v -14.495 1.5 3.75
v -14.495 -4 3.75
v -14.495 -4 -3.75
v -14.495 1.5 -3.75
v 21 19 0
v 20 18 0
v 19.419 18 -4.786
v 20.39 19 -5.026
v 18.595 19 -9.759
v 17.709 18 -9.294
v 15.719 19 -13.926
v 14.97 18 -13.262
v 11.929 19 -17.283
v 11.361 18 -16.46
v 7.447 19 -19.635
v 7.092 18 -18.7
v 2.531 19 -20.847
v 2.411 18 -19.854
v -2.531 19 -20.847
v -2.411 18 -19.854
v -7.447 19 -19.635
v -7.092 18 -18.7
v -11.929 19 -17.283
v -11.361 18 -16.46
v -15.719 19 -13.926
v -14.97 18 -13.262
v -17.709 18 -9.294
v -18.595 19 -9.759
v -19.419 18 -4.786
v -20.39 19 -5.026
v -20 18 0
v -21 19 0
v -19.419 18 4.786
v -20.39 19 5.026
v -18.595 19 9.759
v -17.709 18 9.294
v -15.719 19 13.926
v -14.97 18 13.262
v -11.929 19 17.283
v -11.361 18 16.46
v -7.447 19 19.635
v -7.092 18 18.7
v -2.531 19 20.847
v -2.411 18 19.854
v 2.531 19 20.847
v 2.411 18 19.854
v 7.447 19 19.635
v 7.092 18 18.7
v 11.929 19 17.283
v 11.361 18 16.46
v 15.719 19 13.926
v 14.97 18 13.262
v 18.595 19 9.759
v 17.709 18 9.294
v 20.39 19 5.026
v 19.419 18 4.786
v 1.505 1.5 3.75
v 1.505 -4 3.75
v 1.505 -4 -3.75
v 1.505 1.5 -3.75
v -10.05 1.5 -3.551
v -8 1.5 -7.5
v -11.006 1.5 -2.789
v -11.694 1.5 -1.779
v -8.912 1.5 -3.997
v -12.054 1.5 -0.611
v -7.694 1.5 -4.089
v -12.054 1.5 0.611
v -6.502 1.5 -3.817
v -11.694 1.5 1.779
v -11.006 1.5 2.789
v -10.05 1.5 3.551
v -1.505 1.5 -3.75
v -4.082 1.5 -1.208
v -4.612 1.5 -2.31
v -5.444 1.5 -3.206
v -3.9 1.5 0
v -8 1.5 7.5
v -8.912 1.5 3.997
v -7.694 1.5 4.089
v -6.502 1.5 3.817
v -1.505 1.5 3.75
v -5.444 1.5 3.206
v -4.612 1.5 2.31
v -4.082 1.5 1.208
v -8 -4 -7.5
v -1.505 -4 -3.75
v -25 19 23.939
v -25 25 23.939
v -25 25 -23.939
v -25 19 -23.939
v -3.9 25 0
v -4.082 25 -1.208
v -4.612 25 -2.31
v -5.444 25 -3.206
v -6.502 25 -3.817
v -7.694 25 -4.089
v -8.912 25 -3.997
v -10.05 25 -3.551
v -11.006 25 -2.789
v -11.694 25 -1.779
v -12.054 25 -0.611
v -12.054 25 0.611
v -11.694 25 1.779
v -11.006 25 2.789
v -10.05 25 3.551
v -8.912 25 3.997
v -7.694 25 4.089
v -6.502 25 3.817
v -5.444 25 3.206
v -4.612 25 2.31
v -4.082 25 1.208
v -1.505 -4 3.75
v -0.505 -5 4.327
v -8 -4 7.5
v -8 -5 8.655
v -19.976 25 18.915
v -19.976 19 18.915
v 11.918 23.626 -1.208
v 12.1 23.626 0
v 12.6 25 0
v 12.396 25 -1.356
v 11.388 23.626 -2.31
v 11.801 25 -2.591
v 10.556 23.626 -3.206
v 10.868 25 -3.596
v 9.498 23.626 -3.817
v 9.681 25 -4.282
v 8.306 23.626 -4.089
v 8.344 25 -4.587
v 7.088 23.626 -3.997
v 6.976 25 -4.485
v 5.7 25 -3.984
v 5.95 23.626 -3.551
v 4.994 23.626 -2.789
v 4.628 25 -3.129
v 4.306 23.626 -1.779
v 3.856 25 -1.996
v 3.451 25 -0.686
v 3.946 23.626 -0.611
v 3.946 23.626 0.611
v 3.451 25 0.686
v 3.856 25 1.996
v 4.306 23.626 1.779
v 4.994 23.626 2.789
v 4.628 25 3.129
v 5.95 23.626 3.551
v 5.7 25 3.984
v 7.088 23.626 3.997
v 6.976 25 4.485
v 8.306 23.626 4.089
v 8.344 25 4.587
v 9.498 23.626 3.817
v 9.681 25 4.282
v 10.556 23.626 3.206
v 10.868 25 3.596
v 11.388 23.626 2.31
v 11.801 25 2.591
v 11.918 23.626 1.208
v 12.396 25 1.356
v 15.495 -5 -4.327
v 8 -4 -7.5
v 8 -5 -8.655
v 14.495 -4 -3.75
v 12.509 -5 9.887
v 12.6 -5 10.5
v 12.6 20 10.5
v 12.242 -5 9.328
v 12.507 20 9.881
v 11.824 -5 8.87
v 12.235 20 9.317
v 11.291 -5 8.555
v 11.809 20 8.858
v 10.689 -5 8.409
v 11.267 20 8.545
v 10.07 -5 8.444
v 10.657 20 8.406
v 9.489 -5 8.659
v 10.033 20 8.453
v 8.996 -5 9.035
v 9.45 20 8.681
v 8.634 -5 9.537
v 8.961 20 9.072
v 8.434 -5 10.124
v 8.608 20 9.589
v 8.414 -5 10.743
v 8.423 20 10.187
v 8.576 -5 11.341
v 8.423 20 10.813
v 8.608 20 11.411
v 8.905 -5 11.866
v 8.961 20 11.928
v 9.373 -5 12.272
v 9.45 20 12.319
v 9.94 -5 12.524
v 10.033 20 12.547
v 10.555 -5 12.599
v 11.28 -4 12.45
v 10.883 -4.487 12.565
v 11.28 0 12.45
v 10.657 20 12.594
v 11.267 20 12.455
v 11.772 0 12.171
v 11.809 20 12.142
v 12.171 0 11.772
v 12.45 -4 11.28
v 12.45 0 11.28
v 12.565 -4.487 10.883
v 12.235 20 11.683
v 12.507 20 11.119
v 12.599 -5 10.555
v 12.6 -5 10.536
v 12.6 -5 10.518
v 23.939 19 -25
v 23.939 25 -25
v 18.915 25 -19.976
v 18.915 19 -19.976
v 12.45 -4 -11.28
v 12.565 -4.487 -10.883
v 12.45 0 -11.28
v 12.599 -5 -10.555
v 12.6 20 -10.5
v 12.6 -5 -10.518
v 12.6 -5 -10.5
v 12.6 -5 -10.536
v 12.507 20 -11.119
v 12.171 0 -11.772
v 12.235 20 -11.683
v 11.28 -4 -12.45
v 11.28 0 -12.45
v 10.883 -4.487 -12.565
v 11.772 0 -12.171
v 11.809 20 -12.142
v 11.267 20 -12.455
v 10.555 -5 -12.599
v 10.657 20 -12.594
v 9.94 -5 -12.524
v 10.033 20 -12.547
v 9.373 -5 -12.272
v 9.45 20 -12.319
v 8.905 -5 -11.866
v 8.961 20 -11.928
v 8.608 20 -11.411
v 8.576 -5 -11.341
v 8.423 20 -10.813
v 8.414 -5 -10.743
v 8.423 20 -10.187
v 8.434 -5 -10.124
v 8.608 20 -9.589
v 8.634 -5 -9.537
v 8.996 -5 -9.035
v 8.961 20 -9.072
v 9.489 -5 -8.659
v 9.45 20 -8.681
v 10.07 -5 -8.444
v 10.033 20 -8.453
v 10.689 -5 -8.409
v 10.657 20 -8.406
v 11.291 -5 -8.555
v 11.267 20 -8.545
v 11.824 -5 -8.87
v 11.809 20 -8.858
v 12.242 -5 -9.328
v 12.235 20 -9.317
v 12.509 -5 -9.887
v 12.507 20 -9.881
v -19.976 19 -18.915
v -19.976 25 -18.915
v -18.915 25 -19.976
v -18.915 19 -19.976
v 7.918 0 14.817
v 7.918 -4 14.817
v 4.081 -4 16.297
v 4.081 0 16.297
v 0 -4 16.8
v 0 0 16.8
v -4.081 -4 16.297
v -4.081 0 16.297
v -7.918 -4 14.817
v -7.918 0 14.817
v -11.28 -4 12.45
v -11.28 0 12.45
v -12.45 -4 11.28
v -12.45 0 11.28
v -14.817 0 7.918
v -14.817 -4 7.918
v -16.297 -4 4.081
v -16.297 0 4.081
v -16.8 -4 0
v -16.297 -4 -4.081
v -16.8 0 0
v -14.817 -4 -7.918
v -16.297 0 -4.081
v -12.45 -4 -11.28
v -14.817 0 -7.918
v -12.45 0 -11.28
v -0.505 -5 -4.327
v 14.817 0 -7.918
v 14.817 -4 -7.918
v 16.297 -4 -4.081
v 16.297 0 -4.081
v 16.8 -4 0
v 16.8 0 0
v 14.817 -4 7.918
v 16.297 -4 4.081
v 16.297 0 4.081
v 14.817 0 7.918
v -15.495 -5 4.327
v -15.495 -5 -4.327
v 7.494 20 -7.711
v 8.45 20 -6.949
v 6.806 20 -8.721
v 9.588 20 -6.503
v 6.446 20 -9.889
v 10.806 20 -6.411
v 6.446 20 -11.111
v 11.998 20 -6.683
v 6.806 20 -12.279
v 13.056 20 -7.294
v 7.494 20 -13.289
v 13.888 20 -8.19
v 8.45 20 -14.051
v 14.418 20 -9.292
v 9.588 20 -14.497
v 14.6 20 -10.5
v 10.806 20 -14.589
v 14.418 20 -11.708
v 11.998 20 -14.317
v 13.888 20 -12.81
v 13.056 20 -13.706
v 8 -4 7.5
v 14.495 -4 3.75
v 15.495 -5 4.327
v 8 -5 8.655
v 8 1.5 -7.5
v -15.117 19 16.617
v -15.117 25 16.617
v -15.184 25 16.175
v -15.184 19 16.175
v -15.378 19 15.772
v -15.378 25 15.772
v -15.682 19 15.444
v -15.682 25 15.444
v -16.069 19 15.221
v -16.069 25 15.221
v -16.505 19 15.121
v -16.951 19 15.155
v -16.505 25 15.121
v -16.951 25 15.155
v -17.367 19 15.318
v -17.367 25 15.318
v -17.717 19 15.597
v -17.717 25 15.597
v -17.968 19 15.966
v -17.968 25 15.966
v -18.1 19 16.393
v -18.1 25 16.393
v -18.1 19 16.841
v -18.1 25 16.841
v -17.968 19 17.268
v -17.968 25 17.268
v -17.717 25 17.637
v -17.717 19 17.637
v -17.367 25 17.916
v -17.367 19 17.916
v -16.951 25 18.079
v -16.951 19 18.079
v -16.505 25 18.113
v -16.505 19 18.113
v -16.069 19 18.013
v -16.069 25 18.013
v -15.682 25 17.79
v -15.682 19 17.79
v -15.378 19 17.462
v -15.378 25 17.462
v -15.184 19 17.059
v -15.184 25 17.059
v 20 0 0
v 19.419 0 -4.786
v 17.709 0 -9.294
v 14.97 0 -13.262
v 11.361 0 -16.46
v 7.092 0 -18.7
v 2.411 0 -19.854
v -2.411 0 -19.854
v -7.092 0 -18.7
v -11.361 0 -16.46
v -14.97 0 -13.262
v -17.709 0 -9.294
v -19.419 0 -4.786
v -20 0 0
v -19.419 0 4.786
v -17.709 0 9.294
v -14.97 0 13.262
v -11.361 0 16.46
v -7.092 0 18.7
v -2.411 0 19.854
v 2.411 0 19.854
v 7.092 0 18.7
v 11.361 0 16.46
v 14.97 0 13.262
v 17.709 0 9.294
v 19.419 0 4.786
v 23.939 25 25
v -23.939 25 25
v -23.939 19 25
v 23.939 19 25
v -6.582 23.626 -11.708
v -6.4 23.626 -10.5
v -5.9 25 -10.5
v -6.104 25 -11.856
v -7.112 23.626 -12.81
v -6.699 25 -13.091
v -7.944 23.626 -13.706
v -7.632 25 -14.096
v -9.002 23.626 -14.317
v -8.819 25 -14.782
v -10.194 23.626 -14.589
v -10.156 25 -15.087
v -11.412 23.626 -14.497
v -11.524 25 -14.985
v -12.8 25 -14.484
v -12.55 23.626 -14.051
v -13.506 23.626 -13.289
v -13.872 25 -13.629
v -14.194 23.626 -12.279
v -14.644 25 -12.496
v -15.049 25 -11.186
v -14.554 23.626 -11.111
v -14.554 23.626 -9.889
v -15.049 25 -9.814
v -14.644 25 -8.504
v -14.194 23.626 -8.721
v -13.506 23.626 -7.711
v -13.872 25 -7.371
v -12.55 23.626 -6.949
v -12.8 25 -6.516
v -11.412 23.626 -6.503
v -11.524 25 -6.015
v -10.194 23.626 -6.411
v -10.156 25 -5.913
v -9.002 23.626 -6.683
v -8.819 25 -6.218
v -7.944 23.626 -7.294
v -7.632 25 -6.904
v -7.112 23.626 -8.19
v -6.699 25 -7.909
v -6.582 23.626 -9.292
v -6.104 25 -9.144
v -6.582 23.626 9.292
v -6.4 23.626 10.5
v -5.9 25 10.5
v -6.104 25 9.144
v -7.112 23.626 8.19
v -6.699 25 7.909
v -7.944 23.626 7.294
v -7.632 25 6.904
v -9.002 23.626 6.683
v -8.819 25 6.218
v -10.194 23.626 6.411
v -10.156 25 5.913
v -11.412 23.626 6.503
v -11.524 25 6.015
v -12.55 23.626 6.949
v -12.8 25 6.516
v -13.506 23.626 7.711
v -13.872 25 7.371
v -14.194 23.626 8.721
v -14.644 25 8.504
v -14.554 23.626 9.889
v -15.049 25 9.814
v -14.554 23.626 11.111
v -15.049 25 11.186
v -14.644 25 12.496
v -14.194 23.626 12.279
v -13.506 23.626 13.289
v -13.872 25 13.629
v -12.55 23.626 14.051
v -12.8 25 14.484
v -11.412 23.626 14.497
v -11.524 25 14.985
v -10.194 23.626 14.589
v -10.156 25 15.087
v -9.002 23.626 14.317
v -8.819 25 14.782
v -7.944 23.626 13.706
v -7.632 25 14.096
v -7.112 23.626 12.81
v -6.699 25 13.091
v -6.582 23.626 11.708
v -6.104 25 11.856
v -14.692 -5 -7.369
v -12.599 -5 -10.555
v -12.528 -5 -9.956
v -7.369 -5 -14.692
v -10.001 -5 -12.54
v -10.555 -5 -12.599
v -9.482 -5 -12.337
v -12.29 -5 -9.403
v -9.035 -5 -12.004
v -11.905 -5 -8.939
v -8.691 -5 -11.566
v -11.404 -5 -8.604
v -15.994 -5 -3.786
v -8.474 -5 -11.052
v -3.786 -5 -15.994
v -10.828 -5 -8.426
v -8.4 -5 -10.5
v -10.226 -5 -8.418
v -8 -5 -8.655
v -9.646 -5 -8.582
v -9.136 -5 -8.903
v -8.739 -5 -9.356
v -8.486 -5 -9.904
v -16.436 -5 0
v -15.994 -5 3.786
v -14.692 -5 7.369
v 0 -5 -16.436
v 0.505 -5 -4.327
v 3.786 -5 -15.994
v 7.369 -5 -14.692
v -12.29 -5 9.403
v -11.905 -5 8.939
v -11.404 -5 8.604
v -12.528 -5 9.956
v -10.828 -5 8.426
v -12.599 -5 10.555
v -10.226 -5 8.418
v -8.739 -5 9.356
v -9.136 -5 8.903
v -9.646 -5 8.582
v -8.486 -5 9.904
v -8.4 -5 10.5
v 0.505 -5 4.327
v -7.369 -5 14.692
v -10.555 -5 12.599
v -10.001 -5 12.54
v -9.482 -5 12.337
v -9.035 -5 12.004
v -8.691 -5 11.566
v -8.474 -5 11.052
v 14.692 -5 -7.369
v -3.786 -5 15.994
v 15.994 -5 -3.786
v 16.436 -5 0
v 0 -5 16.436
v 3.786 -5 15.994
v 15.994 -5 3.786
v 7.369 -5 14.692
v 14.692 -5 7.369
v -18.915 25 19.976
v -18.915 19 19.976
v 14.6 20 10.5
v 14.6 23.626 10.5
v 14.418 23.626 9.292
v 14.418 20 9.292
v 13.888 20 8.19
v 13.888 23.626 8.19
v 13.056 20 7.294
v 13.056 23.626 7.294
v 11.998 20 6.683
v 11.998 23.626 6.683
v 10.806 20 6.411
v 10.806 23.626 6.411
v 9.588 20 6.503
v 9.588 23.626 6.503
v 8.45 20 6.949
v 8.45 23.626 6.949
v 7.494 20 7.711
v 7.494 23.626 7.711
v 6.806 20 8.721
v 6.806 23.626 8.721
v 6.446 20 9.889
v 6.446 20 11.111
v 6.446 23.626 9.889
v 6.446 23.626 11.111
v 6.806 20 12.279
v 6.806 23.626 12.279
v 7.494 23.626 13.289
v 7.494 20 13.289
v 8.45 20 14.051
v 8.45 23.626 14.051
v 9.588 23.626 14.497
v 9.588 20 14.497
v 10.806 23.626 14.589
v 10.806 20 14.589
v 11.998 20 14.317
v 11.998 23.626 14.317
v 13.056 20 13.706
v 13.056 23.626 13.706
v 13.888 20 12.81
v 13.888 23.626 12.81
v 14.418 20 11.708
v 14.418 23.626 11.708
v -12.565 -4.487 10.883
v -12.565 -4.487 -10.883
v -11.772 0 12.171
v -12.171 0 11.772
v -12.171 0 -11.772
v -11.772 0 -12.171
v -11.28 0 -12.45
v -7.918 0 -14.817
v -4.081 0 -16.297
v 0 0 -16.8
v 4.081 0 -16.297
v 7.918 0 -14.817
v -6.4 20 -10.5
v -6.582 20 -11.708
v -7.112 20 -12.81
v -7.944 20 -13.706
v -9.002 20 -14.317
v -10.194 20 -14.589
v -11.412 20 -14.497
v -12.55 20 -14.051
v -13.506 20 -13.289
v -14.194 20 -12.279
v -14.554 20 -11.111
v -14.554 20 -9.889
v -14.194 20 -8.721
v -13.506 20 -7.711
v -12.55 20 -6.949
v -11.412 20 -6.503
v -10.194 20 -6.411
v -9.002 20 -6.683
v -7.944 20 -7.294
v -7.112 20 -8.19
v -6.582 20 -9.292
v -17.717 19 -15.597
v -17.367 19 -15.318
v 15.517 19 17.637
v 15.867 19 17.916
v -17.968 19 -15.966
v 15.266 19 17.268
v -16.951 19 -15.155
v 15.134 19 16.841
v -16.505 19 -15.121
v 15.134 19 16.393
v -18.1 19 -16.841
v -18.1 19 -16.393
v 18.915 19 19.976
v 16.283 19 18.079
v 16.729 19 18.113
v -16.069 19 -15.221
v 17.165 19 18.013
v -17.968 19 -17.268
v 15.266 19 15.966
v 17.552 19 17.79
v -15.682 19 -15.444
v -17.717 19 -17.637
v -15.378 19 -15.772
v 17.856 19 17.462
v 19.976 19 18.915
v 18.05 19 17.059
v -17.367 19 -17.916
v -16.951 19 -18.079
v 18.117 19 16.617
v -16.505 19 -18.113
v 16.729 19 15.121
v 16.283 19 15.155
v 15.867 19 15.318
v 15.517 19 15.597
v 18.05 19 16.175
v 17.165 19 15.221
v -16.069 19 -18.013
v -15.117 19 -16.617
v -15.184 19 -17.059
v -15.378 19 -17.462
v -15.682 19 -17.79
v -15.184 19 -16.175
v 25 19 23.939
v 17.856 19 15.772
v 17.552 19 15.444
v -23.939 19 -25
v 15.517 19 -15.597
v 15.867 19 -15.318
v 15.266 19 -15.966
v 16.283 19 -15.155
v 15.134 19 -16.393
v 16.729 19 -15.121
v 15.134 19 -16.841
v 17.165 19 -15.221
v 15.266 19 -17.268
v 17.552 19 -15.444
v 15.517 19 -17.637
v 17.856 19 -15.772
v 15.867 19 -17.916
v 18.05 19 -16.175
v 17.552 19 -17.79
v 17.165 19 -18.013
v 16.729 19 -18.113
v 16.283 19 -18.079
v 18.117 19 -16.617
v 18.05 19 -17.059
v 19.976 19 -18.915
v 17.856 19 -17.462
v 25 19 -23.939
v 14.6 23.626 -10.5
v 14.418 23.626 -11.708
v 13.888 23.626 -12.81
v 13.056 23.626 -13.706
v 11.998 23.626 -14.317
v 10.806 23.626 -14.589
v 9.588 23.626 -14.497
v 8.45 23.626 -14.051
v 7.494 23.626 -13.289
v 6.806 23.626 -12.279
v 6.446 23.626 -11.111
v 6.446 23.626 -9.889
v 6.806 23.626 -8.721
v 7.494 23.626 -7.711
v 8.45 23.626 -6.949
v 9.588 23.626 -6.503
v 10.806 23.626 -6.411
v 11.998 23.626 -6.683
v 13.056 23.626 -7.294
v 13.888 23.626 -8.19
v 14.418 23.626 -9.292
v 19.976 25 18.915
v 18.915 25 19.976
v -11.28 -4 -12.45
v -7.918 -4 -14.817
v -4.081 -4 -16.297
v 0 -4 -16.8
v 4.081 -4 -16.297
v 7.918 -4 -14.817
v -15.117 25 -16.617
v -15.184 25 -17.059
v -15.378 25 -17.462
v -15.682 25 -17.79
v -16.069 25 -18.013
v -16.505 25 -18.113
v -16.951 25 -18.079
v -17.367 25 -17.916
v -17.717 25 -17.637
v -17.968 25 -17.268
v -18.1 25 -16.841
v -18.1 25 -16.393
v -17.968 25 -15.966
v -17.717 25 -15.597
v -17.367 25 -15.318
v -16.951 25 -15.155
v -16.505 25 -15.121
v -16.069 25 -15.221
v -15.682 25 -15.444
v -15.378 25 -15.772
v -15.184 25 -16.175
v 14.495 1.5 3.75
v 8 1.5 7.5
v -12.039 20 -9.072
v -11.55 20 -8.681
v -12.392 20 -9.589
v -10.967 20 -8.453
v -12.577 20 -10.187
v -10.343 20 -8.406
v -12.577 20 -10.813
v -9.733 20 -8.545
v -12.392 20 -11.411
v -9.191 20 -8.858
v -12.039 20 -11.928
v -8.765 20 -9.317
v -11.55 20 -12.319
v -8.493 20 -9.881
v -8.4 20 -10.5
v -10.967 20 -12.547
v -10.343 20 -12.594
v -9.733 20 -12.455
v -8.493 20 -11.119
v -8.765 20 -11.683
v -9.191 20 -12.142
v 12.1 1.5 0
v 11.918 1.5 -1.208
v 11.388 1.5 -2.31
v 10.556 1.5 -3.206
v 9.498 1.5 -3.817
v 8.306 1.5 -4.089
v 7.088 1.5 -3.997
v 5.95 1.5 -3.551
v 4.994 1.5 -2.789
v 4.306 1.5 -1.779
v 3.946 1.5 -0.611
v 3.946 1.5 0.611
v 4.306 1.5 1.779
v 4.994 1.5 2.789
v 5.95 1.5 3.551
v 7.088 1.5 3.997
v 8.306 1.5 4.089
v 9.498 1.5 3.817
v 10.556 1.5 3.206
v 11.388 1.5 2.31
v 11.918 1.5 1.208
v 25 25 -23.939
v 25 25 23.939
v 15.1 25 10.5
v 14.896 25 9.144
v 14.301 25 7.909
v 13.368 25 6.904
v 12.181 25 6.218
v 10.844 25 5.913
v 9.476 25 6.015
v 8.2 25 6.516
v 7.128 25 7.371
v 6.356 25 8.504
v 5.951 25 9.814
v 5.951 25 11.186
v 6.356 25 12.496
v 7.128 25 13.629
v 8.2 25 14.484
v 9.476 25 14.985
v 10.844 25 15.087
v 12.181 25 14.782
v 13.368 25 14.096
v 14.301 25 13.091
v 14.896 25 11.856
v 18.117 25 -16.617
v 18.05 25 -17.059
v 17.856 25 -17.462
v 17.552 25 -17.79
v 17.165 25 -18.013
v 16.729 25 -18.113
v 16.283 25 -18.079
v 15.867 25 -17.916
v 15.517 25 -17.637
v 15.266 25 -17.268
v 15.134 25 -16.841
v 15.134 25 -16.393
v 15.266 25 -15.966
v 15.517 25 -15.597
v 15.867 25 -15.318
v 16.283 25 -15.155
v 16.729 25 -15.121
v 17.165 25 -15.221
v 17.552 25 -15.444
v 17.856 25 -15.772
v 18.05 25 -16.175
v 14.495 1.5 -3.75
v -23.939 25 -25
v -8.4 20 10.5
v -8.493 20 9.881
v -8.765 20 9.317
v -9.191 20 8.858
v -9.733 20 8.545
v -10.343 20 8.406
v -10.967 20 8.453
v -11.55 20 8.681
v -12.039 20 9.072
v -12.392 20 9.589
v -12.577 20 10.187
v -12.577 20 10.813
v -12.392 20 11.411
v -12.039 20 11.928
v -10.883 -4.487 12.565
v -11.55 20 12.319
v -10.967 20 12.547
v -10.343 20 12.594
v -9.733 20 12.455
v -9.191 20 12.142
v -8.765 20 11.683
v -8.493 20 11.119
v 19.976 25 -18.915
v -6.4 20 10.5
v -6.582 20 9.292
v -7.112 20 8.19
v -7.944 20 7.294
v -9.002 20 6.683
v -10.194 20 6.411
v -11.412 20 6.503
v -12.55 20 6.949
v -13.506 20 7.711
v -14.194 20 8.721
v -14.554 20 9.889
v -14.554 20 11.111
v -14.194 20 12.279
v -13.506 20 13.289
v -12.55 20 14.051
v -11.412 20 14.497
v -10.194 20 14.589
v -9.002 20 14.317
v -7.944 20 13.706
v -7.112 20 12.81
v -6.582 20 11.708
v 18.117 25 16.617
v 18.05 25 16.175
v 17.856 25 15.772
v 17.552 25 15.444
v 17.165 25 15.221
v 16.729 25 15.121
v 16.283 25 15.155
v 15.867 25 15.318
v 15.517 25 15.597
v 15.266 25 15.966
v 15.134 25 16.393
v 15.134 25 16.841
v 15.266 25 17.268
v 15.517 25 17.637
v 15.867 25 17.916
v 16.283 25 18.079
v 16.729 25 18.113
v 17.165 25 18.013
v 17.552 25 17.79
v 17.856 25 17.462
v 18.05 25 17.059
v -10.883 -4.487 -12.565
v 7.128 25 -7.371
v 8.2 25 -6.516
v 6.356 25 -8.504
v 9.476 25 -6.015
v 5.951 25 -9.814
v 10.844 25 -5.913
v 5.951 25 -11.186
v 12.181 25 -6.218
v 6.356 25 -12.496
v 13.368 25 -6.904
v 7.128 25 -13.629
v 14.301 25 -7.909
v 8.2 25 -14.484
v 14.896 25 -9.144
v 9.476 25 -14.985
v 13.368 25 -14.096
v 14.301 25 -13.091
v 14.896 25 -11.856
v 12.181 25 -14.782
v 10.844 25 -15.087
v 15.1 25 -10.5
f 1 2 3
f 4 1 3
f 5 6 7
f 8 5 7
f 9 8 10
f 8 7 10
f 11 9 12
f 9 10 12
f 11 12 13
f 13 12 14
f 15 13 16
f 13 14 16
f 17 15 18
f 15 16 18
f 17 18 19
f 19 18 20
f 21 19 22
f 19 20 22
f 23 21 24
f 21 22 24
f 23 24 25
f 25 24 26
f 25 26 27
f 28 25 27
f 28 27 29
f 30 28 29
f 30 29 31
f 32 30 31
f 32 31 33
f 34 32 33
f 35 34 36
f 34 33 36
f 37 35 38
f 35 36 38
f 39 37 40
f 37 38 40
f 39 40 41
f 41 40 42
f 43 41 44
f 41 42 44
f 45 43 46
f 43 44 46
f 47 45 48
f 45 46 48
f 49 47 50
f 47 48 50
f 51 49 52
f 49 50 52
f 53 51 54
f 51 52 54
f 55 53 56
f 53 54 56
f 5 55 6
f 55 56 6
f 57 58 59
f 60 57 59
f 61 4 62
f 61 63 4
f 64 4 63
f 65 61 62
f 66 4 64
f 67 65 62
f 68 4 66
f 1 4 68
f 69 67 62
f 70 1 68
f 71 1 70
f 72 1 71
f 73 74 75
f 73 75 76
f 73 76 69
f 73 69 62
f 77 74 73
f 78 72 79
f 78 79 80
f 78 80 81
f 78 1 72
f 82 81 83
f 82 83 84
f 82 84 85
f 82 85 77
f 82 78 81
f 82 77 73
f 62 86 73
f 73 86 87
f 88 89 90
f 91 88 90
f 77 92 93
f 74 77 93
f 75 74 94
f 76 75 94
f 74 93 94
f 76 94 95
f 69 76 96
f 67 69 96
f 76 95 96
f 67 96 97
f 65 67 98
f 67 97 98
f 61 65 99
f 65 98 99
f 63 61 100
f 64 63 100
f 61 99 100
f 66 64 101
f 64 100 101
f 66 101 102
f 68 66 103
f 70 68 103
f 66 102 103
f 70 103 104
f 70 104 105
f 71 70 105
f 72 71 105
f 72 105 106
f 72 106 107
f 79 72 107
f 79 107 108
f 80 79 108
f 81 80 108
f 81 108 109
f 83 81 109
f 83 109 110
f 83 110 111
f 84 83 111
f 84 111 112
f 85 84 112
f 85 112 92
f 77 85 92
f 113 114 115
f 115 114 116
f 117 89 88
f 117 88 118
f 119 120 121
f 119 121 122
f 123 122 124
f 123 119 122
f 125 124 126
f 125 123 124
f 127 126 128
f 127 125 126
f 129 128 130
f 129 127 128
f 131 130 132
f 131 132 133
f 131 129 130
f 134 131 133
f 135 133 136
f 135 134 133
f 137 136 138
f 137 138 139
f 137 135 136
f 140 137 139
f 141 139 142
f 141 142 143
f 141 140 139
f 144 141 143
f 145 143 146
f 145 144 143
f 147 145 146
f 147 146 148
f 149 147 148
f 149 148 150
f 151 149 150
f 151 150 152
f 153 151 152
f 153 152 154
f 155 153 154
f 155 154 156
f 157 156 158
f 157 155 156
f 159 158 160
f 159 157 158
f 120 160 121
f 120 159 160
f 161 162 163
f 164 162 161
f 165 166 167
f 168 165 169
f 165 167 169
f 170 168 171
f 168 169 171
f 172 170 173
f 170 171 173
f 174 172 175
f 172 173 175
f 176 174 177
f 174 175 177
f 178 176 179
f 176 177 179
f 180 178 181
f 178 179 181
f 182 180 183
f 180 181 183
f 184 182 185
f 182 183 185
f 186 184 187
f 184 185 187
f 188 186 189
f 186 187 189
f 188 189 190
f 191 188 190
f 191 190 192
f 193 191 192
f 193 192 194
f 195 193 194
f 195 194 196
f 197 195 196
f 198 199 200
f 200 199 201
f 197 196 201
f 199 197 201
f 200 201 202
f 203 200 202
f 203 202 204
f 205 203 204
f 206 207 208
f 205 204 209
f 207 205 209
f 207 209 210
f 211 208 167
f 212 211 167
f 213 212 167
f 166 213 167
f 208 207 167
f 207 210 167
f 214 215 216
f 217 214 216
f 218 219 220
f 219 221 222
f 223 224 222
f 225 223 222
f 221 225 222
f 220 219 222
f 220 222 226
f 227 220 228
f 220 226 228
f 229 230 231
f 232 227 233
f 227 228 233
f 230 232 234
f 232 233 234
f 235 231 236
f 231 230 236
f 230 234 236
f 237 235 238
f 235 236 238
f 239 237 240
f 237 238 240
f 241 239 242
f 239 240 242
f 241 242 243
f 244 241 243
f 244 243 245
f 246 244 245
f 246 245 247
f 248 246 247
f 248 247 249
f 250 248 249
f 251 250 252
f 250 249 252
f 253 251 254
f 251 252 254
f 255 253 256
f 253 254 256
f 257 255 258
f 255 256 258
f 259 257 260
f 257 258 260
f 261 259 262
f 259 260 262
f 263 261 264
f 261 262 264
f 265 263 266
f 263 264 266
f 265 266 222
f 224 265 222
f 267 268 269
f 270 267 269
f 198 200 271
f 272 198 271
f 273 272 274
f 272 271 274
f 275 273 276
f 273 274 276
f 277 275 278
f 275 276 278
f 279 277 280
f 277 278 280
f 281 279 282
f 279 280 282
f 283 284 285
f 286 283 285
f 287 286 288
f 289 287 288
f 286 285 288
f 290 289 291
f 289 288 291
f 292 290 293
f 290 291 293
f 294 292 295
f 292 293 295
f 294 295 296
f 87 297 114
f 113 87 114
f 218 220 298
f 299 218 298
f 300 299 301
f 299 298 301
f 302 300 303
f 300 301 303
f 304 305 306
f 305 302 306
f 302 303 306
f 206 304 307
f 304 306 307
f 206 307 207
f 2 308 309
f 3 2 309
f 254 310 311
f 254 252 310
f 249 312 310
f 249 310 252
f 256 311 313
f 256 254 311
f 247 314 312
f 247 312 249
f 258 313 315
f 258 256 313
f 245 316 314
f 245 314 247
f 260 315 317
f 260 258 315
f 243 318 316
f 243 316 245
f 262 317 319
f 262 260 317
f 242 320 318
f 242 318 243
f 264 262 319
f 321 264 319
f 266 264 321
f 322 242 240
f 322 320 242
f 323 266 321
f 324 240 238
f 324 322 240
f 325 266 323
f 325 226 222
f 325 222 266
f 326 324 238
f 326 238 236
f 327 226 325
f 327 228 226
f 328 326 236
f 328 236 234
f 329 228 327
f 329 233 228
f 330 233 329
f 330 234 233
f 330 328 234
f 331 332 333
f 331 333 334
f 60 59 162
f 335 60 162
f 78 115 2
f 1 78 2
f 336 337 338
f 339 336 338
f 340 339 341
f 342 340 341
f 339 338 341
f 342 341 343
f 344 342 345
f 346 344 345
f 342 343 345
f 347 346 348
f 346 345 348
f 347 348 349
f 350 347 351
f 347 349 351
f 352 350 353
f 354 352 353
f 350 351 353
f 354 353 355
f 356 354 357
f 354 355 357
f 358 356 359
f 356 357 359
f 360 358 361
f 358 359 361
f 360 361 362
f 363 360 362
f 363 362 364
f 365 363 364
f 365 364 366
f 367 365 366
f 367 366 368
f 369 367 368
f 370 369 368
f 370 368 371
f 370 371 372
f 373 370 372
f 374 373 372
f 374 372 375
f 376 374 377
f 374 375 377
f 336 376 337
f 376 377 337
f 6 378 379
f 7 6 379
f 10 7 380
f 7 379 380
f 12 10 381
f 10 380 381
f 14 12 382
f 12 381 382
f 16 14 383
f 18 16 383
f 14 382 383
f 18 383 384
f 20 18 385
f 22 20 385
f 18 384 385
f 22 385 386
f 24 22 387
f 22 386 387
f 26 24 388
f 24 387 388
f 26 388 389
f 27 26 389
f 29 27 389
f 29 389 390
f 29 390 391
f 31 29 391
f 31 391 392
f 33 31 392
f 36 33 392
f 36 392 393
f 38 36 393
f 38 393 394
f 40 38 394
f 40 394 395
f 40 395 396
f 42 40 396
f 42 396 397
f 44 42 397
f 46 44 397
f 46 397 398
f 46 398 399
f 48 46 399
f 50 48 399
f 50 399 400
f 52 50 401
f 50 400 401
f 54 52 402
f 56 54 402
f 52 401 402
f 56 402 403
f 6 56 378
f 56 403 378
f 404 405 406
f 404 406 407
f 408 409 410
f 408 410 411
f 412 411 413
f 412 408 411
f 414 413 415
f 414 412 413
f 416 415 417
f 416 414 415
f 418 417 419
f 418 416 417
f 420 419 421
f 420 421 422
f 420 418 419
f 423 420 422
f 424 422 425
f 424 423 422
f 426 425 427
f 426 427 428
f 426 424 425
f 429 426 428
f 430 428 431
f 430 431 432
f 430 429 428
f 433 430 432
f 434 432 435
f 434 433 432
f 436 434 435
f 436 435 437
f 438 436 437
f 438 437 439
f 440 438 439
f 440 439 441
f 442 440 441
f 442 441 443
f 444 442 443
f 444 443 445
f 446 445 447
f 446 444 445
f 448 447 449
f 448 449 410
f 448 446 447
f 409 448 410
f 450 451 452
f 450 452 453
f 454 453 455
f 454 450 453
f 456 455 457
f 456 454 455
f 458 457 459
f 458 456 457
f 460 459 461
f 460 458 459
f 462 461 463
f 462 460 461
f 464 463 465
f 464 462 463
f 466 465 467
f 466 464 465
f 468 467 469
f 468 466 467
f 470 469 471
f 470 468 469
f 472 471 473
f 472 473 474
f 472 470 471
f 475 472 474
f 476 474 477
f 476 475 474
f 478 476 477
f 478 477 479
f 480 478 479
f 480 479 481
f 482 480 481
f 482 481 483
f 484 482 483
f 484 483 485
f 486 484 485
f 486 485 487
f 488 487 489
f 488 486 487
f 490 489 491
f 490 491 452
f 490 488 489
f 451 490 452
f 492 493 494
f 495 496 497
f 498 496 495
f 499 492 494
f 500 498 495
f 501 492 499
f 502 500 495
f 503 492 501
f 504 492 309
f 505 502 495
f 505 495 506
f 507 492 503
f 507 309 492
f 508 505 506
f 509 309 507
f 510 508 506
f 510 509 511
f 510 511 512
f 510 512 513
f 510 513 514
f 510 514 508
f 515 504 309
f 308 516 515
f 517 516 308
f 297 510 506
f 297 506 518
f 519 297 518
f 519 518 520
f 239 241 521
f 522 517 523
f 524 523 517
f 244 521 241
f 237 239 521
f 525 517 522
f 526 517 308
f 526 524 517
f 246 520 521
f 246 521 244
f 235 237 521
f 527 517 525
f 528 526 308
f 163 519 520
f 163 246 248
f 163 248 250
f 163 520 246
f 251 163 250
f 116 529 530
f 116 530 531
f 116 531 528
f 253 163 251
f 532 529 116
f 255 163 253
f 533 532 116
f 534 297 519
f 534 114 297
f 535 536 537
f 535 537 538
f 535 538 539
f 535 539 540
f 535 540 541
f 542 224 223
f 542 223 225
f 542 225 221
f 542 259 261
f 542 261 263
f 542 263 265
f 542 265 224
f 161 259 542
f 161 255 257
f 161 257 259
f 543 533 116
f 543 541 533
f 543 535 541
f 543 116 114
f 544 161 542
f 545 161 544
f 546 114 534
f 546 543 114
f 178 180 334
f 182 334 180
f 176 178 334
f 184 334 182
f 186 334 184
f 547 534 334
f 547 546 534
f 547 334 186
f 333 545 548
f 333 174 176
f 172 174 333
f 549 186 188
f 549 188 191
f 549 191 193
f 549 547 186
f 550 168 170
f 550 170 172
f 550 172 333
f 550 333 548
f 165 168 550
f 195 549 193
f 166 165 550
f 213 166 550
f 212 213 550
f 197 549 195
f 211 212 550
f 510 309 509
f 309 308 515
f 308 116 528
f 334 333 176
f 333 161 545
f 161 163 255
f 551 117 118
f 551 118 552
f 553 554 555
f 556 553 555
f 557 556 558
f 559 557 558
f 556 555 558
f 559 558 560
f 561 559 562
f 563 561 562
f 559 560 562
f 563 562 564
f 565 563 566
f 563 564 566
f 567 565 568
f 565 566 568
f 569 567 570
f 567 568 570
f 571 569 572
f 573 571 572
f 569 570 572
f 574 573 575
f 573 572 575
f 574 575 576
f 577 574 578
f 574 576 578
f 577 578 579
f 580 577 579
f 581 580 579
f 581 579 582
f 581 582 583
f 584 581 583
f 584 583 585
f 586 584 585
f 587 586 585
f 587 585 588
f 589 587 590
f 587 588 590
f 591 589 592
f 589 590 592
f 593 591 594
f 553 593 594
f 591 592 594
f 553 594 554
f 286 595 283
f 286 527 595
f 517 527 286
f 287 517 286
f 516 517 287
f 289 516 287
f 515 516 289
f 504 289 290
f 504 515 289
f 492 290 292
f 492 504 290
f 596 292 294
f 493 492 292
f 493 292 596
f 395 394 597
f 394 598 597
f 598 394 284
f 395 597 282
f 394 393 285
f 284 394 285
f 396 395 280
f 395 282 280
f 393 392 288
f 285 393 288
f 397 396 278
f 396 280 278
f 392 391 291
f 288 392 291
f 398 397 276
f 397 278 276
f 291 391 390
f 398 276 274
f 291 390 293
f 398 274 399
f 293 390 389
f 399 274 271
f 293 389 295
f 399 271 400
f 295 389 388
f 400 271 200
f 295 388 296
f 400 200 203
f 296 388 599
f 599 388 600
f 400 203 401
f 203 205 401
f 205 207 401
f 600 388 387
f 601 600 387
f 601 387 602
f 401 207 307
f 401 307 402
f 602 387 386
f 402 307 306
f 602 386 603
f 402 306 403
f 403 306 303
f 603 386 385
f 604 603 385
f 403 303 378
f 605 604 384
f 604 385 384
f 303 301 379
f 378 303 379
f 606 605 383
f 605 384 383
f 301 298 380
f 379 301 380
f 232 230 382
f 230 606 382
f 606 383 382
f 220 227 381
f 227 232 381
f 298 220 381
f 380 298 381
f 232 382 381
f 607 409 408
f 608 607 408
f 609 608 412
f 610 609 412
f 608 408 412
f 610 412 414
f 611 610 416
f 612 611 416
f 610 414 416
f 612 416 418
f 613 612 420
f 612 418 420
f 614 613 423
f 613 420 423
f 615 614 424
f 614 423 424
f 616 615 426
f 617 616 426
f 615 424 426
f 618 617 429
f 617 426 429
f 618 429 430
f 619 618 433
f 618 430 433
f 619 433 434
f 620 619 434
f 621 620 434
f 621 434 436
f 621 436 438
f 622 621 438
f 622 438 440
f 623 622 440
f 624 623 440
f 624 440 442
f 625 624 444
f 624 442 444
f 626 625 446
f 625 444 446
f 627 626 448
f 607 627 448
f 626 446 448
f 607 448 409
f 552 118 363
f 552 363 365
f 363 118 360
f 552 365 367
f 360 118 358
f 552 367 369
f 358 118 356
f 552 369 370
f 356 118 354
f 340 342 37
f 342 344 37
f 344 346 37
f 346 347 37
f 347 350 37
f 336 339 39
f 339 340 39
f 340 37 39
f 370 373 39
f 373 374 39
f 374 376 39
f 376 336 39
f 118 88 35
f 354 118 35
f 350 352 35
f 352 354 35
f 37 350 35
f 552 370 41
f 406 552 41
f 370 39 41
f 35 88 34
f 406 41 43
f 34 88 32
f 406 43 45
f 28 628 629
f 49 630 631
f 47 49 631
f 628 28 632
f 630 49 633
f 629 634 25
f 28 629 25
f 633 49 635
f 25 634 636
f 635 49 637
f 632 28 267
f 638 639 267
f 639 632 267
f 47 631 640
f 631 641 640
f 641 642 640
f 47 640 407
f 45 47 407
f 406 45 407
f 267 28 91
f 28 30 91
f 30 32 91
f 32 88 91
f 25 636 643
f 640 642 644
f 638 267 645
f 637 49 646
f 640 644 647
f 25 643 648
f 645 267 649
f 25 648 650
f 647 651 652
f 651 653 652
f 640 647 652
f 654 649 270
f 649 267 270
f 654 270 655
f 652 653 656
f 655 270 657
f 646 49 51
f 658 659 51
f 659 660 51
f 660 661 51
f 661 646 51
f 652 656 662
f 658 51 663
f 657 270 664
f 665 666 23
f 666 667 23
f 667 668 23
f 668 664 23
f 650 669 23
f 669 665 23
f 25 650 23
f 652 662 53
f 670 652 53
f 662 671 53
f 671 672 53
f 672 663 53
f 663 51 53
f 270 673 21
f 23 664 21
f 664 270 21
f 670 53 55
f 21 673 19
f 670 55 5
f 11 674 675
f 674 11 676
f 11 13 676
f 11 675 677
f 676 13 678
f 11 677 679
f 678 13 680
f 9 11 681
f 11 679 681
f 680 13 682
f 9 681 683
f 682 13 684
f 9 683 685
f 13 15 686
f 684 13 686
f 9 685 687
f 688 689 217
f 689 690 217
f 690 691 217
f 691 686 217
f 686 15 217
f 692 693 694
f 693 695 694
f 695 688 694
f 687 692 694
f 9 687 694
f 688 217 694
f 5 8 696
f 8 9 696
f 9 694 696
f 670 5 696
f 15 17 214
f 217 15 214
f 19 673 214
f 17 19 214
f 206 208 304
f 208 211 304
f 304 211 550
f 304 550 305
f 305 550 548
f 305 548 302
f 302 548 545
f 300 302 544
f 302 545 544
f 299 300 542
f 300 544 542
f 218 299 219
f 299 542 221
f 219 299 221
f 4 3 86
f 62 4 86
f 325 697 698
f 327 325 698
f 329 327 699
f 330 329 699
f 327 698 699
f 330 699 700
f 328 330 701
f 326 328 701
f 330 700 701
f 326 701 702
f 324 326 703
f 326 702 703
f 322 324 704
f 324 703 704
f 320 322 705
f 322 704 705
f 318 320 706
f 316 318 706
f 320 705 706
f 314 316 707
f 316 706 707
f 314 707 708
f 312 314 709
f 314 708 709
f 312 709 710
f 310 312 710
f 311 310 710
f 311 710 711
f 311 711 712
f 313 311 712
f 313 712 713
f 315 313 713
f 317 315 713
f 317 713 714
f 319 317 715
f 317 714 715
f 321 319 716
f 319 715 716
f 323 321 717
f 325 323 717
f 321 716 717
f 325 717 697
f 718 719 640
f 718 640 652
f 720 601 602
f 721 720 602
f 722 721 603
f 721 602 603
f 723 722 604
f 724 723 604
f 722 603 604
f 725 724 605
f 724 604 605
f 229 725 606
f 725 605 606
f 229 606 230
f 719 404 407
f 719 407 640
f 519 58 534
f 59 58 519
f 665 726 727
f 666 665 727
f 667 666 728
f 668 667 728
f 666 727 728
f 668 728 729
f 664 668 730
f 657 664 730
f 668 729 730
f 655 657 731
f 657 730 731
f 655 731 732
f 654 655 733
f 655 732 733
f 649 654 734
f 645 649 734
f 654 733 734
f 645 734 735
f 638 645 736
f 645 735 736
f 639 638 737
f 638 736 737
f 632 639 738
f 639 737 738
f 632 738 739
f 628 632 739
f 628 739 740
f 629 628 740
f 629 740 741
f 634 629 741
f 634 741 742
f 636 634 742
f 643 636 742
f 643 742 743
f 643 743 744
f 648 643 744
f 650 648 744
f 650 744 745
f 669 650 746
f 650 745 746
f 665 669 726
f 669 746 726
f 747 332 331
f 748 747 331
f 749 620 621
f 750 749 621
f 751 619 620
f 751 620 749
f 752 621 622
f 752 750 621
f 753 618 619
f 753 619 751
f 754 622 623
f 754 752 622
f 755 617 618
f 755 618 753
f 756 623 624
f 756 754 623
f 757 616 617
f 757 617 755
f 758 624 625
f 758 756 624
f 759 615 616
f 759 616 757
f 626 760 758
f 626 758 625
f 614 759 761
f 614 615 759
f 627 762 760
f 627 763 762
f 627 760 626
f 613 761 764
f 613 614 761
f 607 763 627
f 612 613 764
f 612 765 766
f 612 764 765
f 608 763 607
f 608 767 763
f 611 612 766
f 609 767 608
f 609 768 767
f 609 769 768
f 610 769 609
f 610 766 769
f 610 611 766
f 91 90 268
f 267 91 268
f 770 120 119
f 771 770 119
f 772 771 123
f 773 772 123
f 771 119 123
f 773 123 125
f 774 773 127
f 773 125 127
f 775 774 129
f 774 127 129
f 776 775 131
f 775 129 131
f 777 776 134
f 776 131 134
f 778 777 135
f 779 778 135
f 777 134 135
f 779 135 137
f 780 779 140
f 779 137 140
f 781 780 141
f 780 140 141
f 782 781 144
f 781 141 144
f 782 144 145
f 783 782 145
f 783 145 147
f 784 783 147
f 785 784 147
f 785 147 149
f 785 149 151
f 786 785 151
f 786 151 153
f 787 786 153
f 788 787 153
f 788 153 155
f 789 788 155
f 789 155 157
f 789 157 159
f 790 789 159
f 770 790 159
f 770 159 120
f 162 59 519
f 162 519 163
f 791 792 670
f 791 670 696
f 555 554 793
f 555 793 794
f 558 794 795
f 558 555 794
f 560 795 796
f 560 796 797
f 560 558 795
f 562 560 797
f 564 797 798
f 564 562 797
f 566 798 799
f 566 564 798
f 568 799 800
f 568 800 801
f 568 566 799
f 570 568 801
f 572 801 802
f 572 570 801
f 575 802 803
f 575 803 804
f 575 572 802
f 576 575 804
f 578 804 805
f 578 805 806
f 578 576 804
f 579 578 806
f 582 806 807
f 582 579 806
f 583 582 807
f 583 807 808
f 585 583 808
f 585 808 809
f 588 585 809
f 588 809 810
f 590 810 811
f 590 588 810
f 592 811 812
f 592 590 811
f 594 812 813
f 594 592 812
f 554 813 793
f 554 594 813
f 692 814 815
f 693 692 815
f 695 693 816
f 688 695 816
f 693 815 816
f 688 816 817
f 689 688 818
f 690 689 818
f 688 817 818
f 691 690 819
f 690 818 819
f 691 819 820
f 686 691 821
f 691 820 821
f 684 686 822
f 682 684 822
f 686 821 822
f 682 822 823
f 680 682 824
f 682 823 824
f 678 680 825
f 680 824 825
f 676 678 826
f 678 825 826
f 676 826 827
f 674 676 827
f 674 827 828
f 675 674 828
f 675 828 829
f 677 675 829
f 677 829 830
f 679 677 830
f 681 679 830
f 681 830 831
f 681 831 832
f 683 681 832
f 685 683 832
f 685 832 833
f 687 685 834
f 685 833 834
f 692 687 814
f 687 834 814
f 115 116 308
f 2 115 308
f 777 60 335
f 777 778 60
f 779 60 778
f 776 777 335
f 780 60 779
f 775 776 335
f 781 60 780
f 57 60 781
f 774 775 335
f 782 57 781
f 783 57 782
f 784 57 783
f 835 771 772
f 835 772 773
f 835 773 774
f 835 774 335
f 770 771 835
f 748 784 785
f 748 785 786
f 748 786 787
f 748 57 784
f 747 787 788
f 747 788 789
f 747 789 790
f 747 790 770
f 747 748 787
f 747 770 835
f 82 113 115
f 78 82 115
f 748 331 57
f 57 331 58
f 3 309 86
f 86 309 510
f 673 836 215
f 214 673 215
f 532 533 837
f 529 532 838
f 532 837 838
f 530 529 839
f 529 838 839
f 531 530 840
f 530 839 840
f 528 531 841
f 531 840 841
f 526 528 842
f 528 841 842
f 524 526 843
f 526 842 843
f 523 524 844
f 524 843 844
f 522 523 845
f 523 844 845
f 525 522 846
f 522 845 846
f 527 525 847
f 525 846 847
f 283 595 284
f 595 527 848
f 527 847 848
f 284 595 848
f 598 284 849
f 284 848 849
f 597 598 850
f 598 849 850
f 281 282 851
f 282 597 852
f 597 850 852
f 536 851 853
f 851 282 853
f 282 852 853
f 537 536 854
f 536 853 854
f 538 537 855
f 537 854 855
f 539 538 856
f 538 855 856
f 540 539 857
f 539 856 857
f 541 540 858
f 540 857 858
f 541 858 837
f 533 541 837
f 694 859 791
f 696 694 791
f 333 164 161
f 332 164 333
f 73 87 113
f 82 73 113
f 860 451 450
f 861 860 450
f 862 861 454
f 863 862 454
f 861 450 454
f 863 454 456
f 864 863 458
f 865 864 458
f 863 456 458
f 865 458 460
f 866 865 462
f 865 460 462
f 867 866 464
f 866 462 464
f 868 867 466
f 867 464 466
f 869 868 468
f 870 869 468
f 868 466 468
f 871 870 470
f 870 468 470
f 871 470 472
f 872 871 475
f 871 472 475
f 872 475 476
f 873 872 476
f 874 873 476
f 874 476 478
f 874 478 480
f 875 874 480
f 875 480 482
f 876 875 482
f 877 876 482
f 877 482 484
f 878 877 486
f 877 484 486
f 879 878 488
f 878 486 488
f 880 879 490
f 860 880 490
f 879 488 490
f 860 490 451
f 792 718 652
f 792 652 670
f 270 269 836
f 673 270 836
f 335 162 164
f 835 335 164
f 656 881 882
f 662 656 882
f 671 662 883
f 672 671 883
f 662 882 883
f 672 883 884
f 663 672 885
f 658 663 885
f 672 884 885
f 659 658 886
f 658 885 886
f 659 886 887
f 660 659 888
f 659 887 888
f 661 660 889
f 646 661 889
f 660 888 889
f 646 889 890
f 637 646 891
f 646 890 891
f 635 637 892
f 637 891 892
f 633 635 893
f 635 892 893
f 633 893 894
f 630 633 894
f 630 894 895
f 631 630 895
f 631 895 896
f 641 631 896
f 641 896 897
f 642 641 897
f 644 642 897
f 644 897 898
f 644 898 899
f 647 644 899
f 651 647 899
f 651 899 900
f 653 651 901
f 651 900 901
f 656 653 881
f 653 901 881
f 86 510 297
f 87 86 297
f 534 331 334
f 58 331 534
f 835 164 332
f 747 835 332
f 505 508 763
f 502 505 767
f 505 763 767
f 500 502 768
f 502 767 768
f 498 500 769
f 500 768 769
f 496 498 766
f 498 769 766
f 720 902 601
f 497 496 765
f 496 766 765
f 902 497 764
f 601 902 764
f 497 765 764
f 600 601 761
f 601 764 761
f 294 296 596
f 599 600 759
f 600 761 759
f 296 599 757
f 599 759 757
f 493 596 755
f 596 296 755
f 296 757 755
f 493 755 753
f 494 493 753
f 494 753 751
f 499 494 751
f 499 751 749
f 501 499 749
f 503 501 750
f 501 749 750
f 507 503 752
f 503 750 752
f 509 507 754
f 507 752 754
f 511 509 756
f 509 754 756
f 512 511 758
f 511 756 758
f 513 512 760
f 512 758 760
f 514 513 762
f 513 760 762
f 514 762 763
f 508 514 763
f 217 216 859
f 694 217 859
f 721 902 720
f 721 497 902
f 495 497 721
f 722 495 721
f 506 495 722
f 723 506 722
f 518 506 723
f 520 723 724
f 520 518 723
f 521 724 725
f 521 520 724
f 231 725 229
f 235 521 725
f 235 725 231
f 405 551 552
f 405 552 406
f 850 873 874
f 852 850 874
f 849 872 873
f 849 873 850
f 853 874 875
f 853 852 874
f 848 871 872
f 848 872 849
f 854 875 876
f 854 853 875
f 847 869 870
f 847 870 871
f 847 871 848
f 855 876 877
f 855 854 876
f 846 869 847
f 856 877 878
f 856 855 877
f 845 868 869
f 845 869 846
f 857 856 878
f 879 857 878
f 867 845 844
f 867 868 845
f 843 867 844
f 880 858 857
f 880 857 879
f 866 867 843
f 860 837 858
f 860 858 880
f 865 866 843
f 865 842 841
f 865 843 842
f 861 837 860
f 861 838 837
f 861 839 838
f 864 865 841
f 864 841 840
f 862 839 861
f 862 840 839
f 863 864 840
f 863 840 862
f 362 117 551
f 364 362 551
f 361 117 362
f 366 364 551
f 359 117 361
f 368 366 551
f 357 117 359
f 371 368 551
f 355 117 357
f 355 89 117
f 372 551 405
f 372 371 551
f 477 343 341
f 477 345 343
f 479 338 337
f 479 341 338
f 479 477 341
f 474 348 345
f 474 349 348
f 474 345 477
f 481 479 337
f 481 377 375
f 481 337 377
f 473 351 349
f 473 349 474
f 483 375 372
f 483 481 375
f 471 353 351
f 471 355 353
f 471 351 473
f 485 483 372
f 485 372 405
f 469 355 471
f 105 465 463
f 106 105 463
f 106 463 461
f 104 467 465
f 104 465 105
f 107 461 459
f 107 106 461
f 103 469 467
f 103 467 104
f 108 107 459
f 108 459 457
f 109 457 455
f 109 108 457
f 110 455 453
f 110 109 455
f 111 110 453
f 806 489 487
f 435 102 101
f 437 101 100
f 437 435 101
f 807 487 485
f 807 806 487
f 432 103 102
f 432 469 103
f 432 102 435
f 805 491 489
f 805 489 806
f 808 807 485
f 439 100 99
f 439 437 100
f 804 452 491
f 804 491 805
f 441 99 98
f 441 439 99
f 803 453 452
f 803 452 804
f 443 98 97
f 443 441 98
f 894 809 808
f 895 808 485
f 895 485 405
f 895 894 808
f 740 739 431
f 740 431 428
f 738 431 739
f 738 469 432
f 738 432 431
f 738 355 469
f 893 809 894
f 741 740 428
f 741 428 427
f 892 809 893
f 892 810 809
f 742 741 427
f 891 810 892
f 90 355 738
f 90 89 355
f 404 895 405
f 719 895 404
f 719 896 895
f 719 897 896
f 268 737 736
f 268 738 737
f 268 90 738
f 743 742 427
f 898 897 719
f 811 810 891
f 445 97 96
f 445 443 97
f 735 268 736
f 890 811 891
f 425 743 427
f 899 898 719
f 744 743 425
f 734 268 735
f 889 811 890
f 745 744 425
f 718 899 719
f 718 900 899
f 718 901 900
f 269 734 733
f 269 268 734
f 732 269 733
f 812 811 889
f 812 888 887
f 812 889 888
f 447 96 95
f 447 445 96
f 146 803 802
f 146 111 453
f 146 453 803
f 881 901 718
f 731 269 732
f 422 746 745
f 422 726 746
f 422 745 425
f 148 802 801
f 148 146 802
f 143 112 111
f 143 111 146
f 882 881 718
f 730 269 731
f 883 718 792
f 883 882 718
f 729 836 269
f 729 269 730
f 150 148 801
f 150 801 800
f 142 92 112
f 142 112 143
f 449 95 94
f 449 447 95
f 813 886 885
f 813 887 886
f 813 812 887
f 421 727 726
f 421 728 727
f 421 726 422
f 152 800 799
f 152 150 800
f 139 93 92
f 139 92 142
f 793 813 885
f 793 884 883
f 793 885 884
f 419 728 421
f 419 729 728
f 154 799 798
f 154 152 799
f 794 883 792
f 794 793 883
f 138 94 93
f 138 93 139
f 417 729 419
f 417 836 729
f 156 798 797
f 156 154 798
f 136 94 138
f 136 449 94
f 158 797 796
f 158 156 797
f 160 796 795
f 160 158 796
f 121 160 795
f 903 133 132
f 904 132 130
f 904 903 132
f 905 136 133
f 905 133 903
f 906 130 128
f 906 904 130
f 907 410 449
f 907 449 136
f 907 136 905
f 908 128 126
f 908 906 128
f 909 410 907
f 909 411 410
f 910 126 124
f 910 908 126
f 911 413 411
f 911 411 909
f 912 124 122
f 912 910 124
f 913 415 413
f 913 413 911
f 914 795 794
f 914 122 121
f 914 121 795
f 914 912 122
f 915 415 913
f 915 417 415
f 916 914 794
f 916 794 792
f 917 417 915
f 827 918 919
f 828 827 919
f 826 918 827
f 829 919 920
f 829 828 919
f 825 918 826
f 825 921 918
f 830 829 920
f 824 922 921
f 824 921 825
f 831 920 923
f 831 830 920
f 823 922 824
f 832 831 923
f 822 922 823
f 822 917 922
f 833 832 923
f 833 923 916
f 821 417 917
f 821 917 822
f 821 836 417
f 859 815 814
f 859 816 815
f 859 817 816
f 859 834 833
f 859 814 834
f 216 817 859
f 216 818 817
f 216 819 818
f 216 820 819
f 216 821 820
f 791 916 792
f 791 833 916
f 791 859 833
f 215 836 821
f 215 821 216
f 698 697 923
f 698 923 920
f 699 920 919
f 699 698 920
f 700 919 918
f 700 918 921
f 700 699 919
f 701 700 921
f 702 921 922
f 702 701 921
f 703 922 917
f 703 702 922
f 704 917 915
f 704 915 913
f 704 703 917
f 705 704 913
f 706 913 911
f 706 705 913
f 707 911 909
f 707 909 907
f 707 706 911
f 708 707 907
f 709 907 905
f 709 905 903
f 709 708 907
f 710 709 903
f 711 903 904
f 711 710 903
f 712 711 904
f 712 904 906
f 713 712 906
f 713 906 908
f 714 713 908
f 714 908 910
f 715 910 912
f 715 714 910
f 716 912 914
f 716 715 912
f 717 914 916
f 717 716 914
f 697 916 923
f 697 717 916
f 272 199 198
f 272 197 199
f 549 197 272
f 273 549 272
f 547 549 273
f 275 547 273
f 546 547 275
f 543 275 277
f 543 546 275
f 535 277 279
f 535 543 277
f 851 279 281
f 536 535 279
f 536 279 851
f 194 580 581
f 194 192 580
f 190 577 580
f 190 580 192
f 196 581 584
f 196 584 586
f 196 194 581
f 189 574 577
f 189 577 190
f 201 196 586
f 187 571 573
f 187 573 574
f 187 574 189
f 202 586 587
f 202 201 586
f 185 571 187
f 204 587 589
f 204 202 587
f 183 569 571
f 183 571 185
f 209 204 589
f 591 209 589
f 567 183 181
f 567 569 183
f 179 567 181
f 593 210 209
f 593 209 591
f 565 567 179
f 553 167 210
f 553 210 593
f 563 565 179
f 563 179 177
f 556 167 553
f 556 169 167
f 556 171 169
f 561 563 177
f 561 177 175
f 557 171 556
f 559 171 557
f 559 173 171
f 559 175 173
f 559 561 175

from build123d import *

# Parameters (mm, degrees)
SKETCH1_R             = 20
BOSS_EXTRUDE1_DEPTH   = 25
SKETCH3_R             = 16.8
BOSS_EXTRUDE2_DEPTH   = 5
SKETCH4_R             = 4.1
CUT_EXTRUDE1_DEPTH    = 31
SKETCH6_R             = 2.1
CUT_EXTRUDE2_DEPTH    = 31
CHAMFER1_SIZE         = 1
CHAMFER1_SIZE2        = 0.363970234
CHAMFER1_PART_2_SIZE  = 1
CHAMFER1_PART_2_SIZE2 = 0.363970234
CHAMFER1_PART_3_SIZE  = 1
CHAMFER1_PART_3_SIZE2 = 0.363970234
CHAMFER1_PART_4_SIZE  = 1
CHAMFER1_PART_4_SIZE2 = 0.363970234
SKETCH7_R             = 4.1
CUT_EXTRUDE3_DEPTH    = 5
CHAMFER2_SIZE         = 0.5
CHAMFER2_SIZE2        = 1.37373871
SKETCH8_W             = 50
SKETCH8_H             = 50
SKETCH8_R             = 20
SKETCH8_R_2           = 1.5
BOSS_EXTRUDE3_DEPTH   = 6
CUT_EXTRUDE4_DEPTH    = 31.0000001
CHAMFER3_SIZE         = 0.5
CHAMFER3_SIZE2        = 1.37373871
CUT_EXTRUDE5_DEPTH    = 6.5
CHAMFER4_SIZE         = 1


with BuildPart() as part:
    # Sketch1 → Boss-Extrude1 (new body)
    with BuildSketch(Plane(origin=(0, 0, 0), x_dir=(1, 0, 0), z_dir=(0, 1, 0))):
        Circle(SKETCH1_R)
    extrude(amount=BOSS_EXTRUDE1_DEPTH)

    # Sketch3 → Boss-Extrude2 (add)
    with BuildSketch(Plane.XZ):
        Circle(SKETCH3_R)
    extrude(amount=BOSS_EXTRUDE2_DEPTH)

    # Sketch4 → Cut-Extrude1 (cut, through all)
    with BuildSketch(Plane(origin=(0, 25, 0), x_dir=(1, 0, 0), z_dir=(0, 1, 0))):
        with Locations((8, 0)):
            Circle(SKETCH4_R)
        with Locations((-8, 0)):
            Circle(SKETCH4_R)
    extrude(amount=-CUT_EXTRUDE1_DEPTH, mode=Mode.SUBTRACT)

    # Sketch6 → Cut-Extrude2 (cut, through all)
    with BuildSketch(Plane(origin=(0, 25, 0), x_dir=(1, 0, 0), z_dir=(0, 1, 0))):
        with Locations((10.5, -10.5)):
            Circle(SKETCH6_R)
        with Locations((-10.5, -10.5)):
            Circle(SKETCH6_R)
        with Locations((-10.5, 10.5)):
            Circle(SKETCH6_R)
        with Locations((10.5, 10.5)):
            Circle(SKETCH6_R)
    extrude(amount=-CUT_EXTRUDE2_DEPTH, mode=Mode.SUBTRACT)

    # Chamfer1
    chamfer1_edges = [part.edges().sort_by_distance(p)[0] for p in [
        (0, -5, 16.8),
    ]]
    chamfer1_side = [part.faces().sort_by_distance(p)[0] for p in [
        (0, -2.5, 16.8),
    ]]
    chamfer(chamfer1_edges, length=CHAMFER1_SIZE, length2=CHAMFER1_SIZE2, reference=chamfer1_side[0])

    # Chamfer1 part 2
    chamfer1_part_2_edges = [part.edges().sort_by_distance(p)[0] for p in [
        (-16.8, -5, 0),
    ]]
    chamfer1_part_2_side = [part.faces().sort_by_distance(p)[0] for p in [
        (-16.8, -2.5, 0),
    ]]
    chamfer(chamfer1_part_2_edges, length=CHAMFER1_PART_2_SIZE, length2=CHAMFER1_PART_2_SIZE2, reference=chamfer1_part_2_side[0])

    # Chamfer1 part 3
    chamfer1_part_3_edges = [part.edges().sort_by_distance(p)[0] for p in [
        (0, -5, -16.8),
    ]]
    chamfer1_part_3_side = [part.faces().sort_by_distance(p)[0] for p in [
        (0, -2.5, -16.8),
    ]]
    chamfer(chamfer1_part_3_edges, length=CHAMFER1_PART_3_SIZE, length2=CHAMFER1_PART_3_SIZE2, reference=chamfer1_part_3_side[0])

    # Chamfer1 part 4
    chamfer1_part_4_edges = [part.edges().sort_by_distance(p)[0] for p in [
        (16.8, -5, 0),
    ]]
    chamfer1_part_4_side = [part.faces().sort_by_distance(p)[0] for p in [
        (16.8, -2.5, 0),
    ]]
    chamfer(chamfer1_part_4_edges, length=CHAMFER1_PART_4_SIZE, length2=CHAMFER1_PART_4_SIZE2, reference=chamfer1_part_4_side[0])

    # Sketch7 → Cut-Extrude3 (cut)
    with BuildSketch(Plane(origin=(0, 25, 0), x_dir=(1, 0, 0), z_dir=(0, 1, 0))):
        with Locations((10.5, 10.5)):
            Circle(SKETCH7_R)
        with Locations((-10.5, 10.5)):
            Circle(SKETCH7_R)
        with Locations((-10.5, -10.5)):
            Circle(SKETCH7_R)
        with Locations((10.5, -10.5)):
            Circle(SKETCH7_R)
    extrude(amount=-CUT_EXTRUDE3_DEPTH, mode=Mode.SUBTRACT)

    # Chamfer2
    chamfer2_edges = [part.edges().sort_by_distance(p)[0] for p in [
        (3.9, 25, 0),
    ]]
    chamfer2_side = [part.faces().sort_by_distance(p)[0] for p in [
        (0, 25, 0),
    ]]
    chamfer(chamfer2_edges, length=CHAMFER2_SIZE, length2=CHAMFER2_SIZE2, reference=chamfer2_side[0])

    # Sketch8 → Boss-Extrude3 (add)
    with BuildSketch(Plane(origin=(0, 25, 0), x_dir=(1, 0, 0), z_dir=(0, 1, 0))):
        Rectangle(SKETCH8_W, SKETCH8_H)
        Circle(SKETCH8_R, mode=Mode.SUBTRACT)
        with Locations((-16.617009358, -16.617009358)):
            Circle(SKETCH8_R_2, mode=Mode.SUBTRACT)
        with Locations((-16.617009358, 16.617009358)):
            Circle(SKETCH8_R_2, mode=Mode.SUBTRACT)
        with Locations((16.617009358, 16.617009358)):
            Circle(SKETCH8_R_2, mode=Mode.SUBTRACT)
        with Locations((16.617009358, -16.617009358)):
            Circle(SKETCH8_R_2, mode=Mode.SUBTRACT)
    extrude(amount=-BOSS_EXTRUDE3_DEPTH)

    # Sketch10 → Cut-Extrude4 (cut, through all)
    with BuildSketch(Plane(origin=(0, 25, 0), x_dir=(1, 0, 0), z_dir=(0, 1, 0))):
        Polygon((-19.975766569, -18.915106397), (-18.915106397, -19.975766569), (-23.939339828, -25), (-25, -25), (-25, -23.939339828), align=None)
        Polygon((-25, 23.939339828), (-19.975766569, 18.915106397), (-18.915106397, 19.975766569), (-23.939339828, 25), (-25, 25), align=None)
        Polygon((23.939339828, 25), (18.915106397, 19.975766569), (19.975766569, 18.915106397), (25, 23.939339828), (25, 25), align=None)
        Polygon((18.915106397, -19.975766569), (19.975766569, -18.915106397), (25, -23.939339828), (25, -25), (23.939339828, -25), align=None)
    extrude(amount=-CUT_EXTRUDE4_DEPTH, mode=Mode.SUBTRACT)

    # Chamfer3
    chamfer3_edges = [part.edges().sort_by_distance(p)[0] for p in [
        (6.4, 25, -10.5),
        (-14.6, 25, -10.5),
        (-14.6, 25, 10.5),
        (6.4, 25, 10.5),
    ]]
    chamfer3_side = [part.faces().sort_by_distance(p)[0] for p in [
        (-0.052152151, 25, 0),
    ]]
    chamfer(chamfer3_edges, length=CHAMFER3_SIZE, length2=CHAMFER3_SIZE2, reference=chamfer3_side[0])

    # Sketch11 → Cut-Extrude5 (cut)
    with BuildSketch(Plane.XZ.offset(5)):
        Polygon((-8, 7.5), (-14.495190528, 3.75), (-14.495190528, -3.75), (-8, -7.5), (-1.504809472, -3.75), (-1.504809472, 3.75), align=None)
        Polygon((8, 7.5), (1.504809472, 3.75), (1.504809472, -3.75), (8, -7.5), (14.495190528, -3.75), (14.495190528, 3.75), align=None)
    extrude(amount=-CUT_EXTRUDE5_DEPTH, mode=Mode.SUBTRACT)

    # Chamfer4
    chamfer4_edges = [part.edges().sort_by_distance(p)[0] for p in [
        (-20, 19, 0),
        (-4.752404736, -5, 5.625),
        (-11.247595264, -5, 5.625),
        (-14.495190528, -5, 0),
        (-11.247595264, -5, -5.625),
        (-4.752404736, -5, -5.625),
        (-1.504809472, -5, 0),
        (11.247595264, -5, 5.625),
        (4.752404736, -5, 5.625),
        (1.504809472, -5, 0),
        (4.752404736, -5, -5.625),
        (11.247595264, -5, -5.625),
        (14.495190528, -5, 0),
    ]]
    chamfer(chamfer4_edges, length=CHAMFER4_SIZE)


solid = part.part
